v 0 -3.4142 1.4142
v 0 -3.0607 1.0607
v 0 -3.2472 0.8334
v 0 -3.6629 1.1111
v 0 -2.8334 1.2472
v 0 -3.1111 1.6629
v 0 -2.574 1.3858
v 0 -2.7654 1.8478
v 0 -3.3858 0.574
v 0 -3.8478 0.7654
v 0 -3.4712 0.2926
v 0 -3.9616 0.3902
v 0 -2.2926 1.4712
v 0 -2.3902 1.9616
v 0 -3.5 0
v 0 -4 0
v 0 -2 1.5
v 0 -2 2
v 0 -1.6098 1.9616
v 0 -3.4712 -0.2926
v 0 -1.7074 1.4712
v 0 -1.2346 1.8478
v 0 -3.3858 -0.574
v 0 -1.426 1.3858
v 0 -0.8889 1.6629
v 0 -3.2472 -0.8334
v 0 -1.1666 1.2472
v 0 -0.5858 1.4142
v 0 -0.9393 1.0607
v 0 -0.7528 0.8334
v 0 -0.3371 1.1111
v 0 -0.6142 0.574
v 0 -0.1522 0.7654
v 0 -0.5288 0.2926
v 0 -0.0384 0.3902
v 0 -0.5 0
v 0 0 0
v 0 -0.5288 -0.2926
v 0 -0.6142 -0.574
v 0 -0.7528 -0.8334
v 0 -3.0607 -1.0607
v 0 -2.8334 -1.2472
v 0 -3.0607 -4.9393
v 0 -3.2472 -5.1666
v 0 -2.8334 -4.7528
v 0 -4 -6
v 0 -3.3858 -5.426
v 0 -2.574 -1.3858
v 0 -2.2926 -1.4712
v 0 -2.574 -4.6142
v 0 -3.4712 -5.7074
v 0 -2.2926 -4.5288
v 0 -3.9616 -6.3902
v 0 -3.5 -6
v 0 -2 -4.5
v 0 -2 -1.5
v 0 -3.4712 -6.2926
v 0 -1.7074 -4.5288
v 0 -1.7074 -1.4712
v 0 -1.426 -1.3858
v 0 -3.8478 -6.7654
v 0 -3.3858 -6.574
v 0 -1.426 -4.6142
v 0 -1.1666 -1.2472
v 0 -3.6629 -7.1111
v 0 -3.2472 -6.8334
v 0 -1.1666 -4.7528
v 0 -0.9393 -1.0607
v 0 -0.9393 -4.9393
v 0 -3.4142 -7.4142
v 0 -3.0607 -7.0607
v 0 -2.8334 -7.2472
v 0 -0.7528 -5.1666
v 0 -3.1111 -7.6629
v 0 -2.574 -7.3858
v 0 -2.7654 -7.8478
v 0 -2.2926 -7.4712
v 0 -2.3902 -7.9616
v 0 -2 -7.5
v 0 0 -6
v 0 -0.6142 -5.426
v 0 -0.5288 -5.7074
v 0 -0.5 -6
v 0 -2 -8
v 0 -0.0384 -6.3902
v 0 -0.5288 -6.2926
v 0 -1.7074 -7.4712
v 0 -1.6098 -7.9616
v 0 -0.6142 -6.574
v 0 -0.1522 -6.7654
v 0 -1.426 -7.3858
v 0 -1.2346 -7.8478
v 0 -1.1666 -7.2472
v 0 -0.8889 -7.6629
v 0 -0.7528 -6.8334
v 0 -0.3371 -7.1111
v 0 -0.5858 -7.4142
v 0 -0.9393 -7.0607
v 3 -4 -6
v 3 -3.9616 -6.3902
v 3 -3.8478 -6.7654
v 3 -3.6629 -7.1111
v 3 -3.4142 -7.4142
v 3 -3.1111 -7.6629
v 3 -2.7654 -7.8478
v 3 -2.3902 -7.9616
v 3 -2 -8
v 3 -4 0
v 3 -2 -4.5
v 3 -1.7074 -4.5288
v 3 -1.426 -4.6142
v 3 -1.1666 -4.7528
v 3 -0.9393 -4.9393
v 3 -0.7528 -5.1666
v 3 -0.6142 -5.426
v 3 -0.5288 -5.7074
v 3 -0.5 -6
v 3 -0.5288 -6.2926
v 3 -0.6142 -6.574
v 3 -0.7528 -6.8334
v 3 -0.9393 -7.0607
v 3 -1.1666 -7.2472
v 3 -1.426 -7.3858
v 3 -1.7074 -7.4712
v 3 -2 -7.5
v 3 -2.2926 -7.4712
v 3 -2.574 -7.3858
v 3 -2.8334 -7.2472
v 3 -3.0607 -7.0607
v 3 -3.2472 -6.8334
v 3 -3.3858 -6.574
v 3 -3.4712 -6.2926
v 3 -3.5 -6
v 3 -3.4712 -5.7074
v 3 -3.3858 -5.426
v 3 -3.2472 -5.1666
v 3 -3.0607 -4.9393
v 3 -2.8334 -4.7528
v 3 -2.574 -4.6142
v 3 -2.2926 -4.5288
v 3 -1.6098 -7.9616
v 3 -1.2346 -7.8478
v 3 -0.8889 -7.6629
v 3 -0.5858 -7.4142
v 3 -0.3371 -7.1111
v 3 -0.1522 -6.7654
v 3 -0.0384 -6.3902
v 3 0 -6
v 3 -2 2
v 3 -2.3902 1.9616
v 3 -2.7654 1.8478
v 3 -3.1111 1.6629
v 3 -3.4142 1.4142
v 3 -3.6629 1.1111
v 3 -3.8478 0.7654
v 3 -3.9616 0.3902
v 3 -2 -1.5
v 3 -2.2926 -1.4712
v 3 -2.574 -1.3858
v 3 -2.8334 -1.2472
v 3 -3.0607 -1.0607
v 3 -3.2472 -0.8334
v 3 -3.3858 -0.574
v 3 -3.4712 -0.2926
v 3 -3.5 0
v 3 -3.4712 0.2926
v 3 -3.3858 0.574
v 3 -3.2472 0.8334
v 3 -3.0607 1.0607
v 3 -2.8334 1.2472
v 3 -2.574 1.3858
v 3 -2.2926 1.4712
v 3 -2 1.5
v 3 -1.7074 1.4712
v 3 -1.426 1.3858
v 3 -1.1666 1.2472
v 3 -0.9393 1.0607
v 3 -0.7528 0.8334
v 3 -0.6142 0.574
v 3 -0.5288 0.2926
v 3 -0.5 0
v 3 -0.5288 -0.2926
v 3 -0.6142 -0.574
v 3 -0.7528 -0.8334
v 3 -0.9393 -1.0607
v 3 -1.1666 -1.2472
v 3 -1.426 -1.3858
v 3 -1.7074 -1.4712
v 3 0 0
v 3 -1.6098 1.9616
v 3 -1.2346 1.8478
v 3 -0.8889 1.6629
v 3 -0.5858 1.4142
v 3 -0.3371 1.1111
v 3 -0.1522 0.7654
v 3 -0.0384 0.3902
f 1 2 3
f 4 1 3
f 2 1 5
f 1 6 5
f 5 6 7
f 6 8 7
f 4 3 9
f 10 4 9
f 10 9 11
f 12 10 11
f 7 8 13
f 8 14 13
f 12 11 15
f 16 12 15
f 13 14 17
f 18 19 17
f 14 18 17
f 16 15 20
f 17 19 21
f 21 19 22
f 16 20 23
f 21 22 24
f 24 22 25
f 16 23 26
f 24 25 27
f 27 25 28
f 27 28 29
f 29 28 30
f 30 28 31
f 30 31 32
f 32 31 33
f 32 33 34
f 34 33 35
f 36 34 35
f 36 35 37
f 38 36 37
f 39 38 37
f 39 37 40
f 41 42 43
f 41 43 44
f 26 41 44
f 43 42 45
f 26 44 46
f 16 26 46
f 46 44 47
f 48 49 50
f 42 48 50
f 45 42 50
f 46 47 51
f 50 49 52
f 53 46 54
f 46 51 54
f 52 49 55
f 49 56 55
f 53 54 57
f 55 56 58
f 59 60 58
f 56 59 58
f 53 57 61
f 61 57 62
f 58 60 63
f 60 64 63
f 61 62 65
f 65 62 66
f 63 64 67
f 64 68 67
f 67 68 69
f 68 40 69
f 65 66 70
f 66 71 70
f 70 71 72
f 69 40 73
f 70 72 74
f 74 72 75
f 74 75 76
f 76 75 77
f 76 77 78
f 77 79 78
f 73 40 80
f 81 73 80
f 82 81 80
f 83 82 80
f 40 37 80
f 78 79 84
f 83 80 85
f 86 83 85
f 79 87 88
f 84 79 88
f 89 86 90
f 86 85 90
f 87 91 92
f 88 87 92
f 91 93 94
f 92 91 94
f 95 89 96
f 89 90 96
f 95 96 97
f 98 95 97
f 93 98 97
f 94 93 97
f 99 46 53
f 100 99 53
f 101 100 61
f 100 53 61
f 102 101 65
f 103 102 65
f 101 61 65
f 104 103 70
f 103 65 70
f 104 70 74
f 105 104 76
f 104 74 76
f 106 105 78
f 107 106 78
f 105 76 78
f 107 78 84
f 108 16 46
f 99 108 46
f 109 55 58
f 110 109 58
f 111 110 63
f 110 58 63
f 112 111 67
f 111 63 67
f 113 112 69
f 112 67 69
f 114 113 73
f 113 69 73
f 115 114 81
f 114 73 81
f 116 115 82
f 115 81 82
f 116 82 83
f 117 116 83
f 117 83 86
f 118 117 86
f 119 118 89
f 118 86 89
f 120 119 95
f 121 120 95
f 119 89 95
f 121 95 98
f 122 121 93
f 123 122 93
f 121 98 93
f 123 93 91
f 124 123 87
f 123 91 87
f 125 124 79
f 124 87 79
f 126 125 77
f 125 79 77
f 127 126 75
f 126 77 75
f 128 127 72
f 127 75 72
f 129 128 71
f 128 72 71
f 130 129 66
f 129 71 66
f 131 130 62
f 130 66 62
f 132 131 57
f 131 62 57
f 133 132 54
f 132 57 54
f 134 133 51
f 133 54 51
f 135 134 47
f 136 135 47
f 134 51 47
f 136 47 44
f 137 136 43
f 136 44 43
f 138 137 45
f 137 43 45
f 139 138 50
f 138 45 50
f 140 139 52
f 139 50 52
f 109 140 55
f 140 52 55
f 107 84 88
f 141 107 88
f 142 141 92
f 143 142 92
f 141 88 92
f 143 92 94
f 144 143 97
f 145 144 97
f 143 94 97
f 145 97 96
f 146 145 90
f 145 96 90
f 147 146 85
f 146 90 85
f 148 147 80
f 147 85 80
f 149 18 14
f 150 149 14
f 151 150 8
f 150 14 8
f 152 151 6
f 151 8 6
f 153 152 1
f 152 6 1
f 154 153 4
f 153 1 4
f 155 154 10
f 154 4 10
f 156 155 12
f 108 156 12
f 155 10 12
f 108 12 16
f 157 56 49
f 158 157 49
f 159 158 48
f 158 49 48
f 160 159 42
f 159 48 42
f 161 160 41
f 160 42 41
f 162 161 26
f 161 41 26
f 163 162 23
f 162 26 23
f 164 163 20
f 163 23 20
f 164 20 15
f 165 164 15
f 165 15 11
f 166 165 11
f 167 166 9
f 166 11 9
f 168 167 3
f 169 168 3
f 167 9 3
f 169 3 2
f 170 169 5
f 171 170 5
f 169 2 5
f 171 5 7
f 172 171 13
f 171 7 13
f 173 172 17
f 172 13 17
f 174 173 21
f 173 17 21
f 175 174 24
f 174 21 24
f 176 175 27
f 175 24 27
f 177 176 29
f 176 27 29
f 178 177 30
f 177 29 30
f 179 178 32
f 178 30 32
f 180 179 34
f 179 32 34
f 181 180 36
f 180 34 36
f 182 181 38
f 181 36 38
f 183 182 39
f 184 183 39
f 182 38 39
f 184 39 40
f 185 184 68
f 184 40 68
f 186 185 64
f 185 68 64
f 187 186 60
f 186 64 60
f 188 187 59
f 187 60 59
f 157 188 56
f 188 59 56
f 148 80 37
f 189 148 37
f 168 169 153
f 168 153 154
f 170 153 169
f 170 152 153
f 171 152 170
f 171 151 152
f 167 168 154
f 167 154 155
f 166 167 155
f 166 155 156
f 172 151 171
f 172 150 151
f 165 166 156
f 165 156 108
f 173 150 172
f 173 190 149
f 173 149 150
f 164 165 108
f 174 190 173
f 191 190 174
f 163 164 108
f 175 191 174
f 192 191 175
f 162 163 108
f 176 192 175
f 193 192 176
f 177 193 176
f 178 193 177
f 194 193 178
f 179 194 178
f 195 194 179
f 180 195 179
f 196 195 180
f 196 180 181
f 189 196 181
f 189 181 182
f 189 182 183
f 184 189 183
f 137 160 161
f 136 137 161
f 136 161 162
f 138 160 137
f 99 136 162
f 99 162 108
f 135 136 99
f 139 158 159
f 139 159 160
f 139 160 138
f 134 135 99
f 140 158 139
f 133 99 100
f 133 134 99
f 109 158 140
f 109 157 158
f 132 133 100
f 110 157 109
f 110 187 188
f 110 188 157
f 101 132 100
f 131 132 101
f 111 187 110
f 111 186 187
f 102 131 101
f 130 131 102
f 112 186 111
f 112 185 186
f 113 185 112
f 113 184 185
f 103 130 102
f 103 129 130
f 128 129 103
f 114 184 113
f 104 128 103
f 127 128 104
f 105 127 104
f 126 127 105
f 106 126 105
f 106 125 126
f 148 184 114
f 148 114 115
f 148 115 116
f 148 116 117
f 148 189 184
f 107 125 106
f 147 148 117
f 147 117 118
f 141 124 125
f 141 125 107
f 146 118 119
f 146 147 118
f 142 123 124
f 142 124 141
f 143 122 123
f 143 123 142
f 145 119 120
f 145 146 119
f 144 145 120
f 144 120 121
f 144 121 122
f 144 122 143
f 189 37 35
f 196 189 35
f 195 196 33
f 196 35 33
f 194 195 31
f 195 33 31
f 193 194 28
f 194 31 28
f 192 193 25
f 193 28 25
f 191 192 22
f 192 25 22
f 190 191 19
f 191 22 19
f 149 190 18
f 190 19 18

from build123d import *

# Parameters (mm, degrees)
BOSS_EXTRUDE1_DEPTH = 3


with BuildPart() as part:
    # Sketch2 → Boss-Extrude1 (new body)
    with BuildSketch(Plane(origin=(0, 0, 0), x_dir=(0, 0, -1), z_dir=(1, 0, 0))):
        with BuildLine():
            Line((6, 0), (0, 0))
            ThreePointArc((0, 0), (1.414213562, -0.585786438), (2, -2))
            Line((2, -2), (4, -2))
            ThreePointArc((4, -2), (4.585786438, -0.585786438), (6, 0))
        make_face()
        with BuildLine():
            Line((4, -2), (2, -2))
            ThreePointArc((2, -2), (1.414213562, -3.414213562), (0, -4))
            Line((0, -4), (6, -4))
            ThreePointArc((6, -4), (4.585786438, -3.414213562), (4, -2))
        make_face()
        with BuildLine():
            ThreePointArc((2, -2), (1.414213562, -0.585786438), (0, 0))
            ThreePointArc((0, 0), (-1.414213562, -0.585786438), (-2, -2))
            Line((-2, -2), (-1.5, -2))
            ThreePointArc((-1.5, -2), (0, -0.5), (1.5, -2))
            Line((1.5, -2), (2, -2))
        make_face()
        with BuildLine():
            ThreePointArc((0, -4), (1.414213562, -3.414213562), (2, -2))
            Line((2, -2), (1.5, -2))
            ThreePointArc((1.5, -2), (0, -3.5), (-1.5, -2))
            Line((-1.5, -2), (-2, -2))
            ThreePointArc((-2, -2), (-1.414213562, -3.414213562), (0, -4))
        make_face()
        with BuildLine():
            ThreePointArc((8, -2), (7.414213562, -0.585786438), (6, 0))
            ThreePointArc((6, 0), (4.585786438, -0.585786438), (4, -2))
            Line((4, -2), (4.5, -2))
            ThreePointArc((4.5, -2), (6, -0.5), (7.5, -2))
            Line((7.5, -2), (8, -2))
        make_face()
        with BuildLine():
            ThreePointArc((6, -4), (7.414213562, -3.414213562), (8, -2))
            Line((8, -2), (7.5, -2))
            ThreePointArc((7.5, -2), (6, -3.5), (4.5, -2))
            Line((4.5, -2), (4, -2))
            ThreePointArc((4, -2), (4.585786438, -3.414213562), (6, -4))
        make_face()
    extrude(amount=BOSS_EXTRUDE1_DEPTH)


solid = part.part
